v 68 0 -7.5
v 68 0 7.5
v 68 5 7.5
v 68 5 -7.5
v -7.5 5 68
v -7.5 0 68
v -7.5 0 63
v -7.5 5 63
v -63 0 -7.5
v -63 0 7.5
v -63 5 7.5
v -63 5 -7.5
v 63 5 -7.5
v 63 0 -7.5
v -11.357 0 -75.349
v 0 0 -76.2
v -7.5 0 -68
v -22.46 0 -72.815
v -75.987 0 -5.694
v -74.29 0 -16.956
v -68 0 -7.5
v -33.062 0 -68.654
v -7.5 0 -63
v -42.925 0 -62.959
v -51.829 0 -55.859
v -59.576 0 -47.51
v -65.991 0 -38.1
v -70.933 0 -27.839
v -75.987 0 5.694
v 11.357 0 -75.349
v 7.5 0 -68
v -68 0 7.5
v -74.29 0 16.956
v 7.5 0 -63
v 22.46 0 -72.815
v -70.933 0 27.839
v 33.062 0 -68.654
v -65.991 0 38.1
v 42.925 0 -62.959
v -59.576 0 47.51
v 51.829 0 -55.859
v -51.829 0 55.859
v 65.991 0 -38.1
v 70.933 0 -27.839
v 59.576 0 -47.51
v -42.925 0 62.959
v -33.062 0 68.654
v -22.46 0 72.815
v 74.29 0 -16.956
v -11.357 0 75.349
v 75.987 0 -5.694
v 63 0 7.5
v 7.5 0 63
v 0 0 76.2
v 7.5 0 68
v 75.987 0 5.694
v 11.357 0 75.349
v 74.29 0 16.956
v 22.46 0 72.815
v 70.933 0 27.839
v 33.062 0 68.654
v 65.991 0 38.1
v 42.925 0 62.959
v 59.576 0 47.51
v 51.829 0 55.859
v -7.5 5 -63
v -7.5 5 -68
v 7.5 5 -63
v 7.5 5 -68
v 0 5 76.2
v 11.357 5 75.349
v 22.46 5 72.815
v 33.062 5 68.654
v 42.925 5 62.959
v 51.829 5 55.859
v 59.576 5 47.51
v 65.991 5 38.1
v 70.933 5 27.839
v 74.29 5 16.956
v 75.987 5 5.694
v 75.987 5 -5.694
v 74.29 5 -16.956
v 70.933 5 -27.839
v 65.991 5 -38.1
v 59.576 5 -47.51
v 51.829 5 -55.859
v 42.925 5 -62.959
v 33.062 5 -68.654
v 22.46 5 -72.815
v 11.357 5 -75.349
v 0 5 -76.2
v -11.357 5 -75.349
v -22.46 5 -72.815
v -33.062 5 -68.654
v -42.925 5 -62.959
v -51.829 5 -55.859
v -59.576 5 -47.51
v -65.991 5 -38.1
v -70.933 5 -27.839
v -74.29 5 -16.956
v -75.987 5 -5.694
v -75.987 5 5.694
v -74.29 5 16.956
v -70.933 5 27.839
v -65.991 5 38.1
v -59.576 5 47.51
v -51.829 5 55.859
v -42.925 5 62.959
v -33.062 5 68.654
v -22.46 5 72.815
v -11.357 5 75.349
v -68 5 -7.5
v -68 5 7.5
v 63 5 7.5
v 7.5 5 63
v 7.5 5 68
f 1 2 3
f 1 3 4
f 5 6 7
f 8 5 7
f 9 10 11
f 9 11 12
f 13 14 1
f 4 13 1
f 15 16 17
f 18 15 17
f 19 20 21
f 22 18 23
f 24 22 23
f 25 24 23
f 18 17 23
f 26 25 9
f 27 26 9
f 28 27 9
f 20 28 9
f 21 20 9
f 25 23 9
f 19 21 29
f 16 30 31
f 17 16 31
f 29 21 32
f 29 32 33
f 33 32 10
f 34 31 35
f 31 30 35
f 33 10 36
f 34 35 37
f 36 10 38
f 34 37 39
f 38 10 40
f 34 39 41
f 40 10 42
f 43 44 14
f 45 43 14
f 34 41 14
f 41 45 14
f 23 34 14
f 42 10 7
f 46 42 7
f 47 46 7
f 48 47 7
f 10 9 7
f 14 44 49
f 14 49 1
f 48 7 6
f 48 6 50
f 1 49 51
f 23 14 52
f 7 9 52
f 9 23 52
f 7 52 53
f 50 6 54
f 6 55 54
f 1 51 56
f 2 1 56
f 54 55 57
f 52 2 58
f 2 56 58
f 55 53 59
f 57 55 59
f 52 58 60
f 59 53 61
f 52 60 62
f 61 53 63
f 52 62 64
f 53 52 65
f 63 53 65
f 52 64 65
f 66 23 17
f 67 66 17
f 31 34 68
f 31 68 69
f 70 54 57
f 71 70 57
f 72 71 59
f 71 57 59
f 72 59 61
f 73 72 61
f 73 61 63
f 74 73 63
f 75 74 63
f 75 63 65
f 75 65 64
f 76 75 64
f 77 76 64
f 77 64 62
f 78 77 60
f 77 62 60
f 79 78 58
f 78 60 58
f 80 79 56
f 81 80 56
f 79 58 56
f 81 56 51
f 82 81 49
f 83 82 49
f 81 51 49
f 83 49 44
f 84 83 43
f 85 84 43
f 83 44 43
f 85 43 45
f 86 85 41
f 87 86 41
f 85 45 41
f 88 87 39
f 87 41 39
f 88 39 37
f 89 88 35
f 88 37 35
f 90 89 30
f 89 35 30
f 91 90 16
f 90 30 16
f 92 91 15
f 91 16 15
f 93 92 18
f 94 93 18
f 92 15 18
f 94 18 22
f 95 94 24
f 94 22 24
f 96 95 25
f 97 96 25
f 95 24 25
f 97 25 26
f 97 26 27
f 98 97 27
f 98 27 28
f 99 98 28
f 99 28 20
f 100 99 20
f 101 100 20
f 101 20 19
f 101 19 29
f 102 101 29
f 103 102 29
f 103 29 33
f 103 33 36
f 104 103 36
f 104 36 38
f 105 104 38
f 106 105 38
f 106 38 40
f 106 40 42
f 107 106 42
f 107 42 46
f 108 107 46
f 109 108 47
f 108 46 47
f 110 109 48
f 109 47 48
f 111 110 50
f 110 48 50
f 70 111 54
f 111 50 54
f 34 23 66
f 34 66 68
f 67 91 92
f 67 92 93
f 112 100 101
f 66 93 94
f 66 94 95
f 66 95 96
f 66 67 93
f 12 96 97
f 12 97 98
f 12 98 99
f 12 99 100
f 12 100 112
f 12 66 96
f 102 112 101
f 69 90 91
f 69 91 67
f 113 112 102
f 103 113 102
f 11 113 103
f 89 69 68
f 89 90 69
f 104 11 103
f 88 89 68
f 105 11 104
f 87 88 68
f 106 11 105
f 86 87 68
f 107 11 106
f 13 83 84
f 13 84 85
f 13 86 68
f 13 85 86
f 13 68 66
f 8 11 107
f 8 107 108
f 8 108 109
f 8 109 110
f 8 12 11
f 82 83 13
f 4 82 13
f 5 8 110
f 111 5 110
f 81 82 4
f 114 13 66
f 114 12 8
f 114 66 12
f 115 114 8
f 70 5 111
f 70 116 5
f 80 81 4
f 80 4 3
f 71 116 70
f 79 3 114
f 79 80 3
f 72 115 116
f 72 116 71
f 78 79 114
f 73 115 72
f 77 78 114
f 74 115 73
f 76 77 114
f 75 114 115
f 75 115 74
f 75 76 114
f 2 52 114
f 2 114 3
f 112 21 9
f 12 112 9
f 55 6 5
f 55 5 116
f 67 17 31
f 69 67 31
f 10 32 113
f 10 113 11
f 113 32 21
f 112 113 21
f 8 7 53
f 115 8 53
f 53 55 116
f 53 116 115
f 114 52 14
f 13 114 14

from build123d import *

# Parameters (mm, degrees)
SKETCH1_R           = 76.2
SKETCH1_W           = 15
SKETCH1_H           = 5
SKETCH1_W_2         = 5
SKETCH1_H_2         = 15
BOSS_EXTRUDE1_DEPTH = 5


with BuildPart() as part:
    # Sketch1 → Boss-Extrude1 (new body)
    with BuildSketch(Plane(origin=(0, 0, 0), x_dir=(1, 0, 0), z_dir=(0, 1, 0))):
        with Locations(Location((0, 0, 0), (0, 0, 270))):
            Circle(SKETCH1_R)
        with Locations((0, 65.5)):
            Rectangle(SKETCH1_W, SKETCH1_H, mode=Mode.SUBTRACT)
        with Locations((-65.5, 0)):
            Rectangle(SKETCH1_W_2, SKETCH1_H_2, mode=Mode.SUBTRACT)
        with Locations((65.5, 0)):
            Rectangle(SKETCH1_W_2, SKETCH1_H_2, mode=Mode.SUBTRACT)
        with Locations((0, -65.5)):
            Rectangle(SKETCH1_W, SKETCH1_H, mode=Mode.SUBTRACT)
    extrude(amount=BOSS_EXTRUDE1_DEPTH)


solid = part.part
